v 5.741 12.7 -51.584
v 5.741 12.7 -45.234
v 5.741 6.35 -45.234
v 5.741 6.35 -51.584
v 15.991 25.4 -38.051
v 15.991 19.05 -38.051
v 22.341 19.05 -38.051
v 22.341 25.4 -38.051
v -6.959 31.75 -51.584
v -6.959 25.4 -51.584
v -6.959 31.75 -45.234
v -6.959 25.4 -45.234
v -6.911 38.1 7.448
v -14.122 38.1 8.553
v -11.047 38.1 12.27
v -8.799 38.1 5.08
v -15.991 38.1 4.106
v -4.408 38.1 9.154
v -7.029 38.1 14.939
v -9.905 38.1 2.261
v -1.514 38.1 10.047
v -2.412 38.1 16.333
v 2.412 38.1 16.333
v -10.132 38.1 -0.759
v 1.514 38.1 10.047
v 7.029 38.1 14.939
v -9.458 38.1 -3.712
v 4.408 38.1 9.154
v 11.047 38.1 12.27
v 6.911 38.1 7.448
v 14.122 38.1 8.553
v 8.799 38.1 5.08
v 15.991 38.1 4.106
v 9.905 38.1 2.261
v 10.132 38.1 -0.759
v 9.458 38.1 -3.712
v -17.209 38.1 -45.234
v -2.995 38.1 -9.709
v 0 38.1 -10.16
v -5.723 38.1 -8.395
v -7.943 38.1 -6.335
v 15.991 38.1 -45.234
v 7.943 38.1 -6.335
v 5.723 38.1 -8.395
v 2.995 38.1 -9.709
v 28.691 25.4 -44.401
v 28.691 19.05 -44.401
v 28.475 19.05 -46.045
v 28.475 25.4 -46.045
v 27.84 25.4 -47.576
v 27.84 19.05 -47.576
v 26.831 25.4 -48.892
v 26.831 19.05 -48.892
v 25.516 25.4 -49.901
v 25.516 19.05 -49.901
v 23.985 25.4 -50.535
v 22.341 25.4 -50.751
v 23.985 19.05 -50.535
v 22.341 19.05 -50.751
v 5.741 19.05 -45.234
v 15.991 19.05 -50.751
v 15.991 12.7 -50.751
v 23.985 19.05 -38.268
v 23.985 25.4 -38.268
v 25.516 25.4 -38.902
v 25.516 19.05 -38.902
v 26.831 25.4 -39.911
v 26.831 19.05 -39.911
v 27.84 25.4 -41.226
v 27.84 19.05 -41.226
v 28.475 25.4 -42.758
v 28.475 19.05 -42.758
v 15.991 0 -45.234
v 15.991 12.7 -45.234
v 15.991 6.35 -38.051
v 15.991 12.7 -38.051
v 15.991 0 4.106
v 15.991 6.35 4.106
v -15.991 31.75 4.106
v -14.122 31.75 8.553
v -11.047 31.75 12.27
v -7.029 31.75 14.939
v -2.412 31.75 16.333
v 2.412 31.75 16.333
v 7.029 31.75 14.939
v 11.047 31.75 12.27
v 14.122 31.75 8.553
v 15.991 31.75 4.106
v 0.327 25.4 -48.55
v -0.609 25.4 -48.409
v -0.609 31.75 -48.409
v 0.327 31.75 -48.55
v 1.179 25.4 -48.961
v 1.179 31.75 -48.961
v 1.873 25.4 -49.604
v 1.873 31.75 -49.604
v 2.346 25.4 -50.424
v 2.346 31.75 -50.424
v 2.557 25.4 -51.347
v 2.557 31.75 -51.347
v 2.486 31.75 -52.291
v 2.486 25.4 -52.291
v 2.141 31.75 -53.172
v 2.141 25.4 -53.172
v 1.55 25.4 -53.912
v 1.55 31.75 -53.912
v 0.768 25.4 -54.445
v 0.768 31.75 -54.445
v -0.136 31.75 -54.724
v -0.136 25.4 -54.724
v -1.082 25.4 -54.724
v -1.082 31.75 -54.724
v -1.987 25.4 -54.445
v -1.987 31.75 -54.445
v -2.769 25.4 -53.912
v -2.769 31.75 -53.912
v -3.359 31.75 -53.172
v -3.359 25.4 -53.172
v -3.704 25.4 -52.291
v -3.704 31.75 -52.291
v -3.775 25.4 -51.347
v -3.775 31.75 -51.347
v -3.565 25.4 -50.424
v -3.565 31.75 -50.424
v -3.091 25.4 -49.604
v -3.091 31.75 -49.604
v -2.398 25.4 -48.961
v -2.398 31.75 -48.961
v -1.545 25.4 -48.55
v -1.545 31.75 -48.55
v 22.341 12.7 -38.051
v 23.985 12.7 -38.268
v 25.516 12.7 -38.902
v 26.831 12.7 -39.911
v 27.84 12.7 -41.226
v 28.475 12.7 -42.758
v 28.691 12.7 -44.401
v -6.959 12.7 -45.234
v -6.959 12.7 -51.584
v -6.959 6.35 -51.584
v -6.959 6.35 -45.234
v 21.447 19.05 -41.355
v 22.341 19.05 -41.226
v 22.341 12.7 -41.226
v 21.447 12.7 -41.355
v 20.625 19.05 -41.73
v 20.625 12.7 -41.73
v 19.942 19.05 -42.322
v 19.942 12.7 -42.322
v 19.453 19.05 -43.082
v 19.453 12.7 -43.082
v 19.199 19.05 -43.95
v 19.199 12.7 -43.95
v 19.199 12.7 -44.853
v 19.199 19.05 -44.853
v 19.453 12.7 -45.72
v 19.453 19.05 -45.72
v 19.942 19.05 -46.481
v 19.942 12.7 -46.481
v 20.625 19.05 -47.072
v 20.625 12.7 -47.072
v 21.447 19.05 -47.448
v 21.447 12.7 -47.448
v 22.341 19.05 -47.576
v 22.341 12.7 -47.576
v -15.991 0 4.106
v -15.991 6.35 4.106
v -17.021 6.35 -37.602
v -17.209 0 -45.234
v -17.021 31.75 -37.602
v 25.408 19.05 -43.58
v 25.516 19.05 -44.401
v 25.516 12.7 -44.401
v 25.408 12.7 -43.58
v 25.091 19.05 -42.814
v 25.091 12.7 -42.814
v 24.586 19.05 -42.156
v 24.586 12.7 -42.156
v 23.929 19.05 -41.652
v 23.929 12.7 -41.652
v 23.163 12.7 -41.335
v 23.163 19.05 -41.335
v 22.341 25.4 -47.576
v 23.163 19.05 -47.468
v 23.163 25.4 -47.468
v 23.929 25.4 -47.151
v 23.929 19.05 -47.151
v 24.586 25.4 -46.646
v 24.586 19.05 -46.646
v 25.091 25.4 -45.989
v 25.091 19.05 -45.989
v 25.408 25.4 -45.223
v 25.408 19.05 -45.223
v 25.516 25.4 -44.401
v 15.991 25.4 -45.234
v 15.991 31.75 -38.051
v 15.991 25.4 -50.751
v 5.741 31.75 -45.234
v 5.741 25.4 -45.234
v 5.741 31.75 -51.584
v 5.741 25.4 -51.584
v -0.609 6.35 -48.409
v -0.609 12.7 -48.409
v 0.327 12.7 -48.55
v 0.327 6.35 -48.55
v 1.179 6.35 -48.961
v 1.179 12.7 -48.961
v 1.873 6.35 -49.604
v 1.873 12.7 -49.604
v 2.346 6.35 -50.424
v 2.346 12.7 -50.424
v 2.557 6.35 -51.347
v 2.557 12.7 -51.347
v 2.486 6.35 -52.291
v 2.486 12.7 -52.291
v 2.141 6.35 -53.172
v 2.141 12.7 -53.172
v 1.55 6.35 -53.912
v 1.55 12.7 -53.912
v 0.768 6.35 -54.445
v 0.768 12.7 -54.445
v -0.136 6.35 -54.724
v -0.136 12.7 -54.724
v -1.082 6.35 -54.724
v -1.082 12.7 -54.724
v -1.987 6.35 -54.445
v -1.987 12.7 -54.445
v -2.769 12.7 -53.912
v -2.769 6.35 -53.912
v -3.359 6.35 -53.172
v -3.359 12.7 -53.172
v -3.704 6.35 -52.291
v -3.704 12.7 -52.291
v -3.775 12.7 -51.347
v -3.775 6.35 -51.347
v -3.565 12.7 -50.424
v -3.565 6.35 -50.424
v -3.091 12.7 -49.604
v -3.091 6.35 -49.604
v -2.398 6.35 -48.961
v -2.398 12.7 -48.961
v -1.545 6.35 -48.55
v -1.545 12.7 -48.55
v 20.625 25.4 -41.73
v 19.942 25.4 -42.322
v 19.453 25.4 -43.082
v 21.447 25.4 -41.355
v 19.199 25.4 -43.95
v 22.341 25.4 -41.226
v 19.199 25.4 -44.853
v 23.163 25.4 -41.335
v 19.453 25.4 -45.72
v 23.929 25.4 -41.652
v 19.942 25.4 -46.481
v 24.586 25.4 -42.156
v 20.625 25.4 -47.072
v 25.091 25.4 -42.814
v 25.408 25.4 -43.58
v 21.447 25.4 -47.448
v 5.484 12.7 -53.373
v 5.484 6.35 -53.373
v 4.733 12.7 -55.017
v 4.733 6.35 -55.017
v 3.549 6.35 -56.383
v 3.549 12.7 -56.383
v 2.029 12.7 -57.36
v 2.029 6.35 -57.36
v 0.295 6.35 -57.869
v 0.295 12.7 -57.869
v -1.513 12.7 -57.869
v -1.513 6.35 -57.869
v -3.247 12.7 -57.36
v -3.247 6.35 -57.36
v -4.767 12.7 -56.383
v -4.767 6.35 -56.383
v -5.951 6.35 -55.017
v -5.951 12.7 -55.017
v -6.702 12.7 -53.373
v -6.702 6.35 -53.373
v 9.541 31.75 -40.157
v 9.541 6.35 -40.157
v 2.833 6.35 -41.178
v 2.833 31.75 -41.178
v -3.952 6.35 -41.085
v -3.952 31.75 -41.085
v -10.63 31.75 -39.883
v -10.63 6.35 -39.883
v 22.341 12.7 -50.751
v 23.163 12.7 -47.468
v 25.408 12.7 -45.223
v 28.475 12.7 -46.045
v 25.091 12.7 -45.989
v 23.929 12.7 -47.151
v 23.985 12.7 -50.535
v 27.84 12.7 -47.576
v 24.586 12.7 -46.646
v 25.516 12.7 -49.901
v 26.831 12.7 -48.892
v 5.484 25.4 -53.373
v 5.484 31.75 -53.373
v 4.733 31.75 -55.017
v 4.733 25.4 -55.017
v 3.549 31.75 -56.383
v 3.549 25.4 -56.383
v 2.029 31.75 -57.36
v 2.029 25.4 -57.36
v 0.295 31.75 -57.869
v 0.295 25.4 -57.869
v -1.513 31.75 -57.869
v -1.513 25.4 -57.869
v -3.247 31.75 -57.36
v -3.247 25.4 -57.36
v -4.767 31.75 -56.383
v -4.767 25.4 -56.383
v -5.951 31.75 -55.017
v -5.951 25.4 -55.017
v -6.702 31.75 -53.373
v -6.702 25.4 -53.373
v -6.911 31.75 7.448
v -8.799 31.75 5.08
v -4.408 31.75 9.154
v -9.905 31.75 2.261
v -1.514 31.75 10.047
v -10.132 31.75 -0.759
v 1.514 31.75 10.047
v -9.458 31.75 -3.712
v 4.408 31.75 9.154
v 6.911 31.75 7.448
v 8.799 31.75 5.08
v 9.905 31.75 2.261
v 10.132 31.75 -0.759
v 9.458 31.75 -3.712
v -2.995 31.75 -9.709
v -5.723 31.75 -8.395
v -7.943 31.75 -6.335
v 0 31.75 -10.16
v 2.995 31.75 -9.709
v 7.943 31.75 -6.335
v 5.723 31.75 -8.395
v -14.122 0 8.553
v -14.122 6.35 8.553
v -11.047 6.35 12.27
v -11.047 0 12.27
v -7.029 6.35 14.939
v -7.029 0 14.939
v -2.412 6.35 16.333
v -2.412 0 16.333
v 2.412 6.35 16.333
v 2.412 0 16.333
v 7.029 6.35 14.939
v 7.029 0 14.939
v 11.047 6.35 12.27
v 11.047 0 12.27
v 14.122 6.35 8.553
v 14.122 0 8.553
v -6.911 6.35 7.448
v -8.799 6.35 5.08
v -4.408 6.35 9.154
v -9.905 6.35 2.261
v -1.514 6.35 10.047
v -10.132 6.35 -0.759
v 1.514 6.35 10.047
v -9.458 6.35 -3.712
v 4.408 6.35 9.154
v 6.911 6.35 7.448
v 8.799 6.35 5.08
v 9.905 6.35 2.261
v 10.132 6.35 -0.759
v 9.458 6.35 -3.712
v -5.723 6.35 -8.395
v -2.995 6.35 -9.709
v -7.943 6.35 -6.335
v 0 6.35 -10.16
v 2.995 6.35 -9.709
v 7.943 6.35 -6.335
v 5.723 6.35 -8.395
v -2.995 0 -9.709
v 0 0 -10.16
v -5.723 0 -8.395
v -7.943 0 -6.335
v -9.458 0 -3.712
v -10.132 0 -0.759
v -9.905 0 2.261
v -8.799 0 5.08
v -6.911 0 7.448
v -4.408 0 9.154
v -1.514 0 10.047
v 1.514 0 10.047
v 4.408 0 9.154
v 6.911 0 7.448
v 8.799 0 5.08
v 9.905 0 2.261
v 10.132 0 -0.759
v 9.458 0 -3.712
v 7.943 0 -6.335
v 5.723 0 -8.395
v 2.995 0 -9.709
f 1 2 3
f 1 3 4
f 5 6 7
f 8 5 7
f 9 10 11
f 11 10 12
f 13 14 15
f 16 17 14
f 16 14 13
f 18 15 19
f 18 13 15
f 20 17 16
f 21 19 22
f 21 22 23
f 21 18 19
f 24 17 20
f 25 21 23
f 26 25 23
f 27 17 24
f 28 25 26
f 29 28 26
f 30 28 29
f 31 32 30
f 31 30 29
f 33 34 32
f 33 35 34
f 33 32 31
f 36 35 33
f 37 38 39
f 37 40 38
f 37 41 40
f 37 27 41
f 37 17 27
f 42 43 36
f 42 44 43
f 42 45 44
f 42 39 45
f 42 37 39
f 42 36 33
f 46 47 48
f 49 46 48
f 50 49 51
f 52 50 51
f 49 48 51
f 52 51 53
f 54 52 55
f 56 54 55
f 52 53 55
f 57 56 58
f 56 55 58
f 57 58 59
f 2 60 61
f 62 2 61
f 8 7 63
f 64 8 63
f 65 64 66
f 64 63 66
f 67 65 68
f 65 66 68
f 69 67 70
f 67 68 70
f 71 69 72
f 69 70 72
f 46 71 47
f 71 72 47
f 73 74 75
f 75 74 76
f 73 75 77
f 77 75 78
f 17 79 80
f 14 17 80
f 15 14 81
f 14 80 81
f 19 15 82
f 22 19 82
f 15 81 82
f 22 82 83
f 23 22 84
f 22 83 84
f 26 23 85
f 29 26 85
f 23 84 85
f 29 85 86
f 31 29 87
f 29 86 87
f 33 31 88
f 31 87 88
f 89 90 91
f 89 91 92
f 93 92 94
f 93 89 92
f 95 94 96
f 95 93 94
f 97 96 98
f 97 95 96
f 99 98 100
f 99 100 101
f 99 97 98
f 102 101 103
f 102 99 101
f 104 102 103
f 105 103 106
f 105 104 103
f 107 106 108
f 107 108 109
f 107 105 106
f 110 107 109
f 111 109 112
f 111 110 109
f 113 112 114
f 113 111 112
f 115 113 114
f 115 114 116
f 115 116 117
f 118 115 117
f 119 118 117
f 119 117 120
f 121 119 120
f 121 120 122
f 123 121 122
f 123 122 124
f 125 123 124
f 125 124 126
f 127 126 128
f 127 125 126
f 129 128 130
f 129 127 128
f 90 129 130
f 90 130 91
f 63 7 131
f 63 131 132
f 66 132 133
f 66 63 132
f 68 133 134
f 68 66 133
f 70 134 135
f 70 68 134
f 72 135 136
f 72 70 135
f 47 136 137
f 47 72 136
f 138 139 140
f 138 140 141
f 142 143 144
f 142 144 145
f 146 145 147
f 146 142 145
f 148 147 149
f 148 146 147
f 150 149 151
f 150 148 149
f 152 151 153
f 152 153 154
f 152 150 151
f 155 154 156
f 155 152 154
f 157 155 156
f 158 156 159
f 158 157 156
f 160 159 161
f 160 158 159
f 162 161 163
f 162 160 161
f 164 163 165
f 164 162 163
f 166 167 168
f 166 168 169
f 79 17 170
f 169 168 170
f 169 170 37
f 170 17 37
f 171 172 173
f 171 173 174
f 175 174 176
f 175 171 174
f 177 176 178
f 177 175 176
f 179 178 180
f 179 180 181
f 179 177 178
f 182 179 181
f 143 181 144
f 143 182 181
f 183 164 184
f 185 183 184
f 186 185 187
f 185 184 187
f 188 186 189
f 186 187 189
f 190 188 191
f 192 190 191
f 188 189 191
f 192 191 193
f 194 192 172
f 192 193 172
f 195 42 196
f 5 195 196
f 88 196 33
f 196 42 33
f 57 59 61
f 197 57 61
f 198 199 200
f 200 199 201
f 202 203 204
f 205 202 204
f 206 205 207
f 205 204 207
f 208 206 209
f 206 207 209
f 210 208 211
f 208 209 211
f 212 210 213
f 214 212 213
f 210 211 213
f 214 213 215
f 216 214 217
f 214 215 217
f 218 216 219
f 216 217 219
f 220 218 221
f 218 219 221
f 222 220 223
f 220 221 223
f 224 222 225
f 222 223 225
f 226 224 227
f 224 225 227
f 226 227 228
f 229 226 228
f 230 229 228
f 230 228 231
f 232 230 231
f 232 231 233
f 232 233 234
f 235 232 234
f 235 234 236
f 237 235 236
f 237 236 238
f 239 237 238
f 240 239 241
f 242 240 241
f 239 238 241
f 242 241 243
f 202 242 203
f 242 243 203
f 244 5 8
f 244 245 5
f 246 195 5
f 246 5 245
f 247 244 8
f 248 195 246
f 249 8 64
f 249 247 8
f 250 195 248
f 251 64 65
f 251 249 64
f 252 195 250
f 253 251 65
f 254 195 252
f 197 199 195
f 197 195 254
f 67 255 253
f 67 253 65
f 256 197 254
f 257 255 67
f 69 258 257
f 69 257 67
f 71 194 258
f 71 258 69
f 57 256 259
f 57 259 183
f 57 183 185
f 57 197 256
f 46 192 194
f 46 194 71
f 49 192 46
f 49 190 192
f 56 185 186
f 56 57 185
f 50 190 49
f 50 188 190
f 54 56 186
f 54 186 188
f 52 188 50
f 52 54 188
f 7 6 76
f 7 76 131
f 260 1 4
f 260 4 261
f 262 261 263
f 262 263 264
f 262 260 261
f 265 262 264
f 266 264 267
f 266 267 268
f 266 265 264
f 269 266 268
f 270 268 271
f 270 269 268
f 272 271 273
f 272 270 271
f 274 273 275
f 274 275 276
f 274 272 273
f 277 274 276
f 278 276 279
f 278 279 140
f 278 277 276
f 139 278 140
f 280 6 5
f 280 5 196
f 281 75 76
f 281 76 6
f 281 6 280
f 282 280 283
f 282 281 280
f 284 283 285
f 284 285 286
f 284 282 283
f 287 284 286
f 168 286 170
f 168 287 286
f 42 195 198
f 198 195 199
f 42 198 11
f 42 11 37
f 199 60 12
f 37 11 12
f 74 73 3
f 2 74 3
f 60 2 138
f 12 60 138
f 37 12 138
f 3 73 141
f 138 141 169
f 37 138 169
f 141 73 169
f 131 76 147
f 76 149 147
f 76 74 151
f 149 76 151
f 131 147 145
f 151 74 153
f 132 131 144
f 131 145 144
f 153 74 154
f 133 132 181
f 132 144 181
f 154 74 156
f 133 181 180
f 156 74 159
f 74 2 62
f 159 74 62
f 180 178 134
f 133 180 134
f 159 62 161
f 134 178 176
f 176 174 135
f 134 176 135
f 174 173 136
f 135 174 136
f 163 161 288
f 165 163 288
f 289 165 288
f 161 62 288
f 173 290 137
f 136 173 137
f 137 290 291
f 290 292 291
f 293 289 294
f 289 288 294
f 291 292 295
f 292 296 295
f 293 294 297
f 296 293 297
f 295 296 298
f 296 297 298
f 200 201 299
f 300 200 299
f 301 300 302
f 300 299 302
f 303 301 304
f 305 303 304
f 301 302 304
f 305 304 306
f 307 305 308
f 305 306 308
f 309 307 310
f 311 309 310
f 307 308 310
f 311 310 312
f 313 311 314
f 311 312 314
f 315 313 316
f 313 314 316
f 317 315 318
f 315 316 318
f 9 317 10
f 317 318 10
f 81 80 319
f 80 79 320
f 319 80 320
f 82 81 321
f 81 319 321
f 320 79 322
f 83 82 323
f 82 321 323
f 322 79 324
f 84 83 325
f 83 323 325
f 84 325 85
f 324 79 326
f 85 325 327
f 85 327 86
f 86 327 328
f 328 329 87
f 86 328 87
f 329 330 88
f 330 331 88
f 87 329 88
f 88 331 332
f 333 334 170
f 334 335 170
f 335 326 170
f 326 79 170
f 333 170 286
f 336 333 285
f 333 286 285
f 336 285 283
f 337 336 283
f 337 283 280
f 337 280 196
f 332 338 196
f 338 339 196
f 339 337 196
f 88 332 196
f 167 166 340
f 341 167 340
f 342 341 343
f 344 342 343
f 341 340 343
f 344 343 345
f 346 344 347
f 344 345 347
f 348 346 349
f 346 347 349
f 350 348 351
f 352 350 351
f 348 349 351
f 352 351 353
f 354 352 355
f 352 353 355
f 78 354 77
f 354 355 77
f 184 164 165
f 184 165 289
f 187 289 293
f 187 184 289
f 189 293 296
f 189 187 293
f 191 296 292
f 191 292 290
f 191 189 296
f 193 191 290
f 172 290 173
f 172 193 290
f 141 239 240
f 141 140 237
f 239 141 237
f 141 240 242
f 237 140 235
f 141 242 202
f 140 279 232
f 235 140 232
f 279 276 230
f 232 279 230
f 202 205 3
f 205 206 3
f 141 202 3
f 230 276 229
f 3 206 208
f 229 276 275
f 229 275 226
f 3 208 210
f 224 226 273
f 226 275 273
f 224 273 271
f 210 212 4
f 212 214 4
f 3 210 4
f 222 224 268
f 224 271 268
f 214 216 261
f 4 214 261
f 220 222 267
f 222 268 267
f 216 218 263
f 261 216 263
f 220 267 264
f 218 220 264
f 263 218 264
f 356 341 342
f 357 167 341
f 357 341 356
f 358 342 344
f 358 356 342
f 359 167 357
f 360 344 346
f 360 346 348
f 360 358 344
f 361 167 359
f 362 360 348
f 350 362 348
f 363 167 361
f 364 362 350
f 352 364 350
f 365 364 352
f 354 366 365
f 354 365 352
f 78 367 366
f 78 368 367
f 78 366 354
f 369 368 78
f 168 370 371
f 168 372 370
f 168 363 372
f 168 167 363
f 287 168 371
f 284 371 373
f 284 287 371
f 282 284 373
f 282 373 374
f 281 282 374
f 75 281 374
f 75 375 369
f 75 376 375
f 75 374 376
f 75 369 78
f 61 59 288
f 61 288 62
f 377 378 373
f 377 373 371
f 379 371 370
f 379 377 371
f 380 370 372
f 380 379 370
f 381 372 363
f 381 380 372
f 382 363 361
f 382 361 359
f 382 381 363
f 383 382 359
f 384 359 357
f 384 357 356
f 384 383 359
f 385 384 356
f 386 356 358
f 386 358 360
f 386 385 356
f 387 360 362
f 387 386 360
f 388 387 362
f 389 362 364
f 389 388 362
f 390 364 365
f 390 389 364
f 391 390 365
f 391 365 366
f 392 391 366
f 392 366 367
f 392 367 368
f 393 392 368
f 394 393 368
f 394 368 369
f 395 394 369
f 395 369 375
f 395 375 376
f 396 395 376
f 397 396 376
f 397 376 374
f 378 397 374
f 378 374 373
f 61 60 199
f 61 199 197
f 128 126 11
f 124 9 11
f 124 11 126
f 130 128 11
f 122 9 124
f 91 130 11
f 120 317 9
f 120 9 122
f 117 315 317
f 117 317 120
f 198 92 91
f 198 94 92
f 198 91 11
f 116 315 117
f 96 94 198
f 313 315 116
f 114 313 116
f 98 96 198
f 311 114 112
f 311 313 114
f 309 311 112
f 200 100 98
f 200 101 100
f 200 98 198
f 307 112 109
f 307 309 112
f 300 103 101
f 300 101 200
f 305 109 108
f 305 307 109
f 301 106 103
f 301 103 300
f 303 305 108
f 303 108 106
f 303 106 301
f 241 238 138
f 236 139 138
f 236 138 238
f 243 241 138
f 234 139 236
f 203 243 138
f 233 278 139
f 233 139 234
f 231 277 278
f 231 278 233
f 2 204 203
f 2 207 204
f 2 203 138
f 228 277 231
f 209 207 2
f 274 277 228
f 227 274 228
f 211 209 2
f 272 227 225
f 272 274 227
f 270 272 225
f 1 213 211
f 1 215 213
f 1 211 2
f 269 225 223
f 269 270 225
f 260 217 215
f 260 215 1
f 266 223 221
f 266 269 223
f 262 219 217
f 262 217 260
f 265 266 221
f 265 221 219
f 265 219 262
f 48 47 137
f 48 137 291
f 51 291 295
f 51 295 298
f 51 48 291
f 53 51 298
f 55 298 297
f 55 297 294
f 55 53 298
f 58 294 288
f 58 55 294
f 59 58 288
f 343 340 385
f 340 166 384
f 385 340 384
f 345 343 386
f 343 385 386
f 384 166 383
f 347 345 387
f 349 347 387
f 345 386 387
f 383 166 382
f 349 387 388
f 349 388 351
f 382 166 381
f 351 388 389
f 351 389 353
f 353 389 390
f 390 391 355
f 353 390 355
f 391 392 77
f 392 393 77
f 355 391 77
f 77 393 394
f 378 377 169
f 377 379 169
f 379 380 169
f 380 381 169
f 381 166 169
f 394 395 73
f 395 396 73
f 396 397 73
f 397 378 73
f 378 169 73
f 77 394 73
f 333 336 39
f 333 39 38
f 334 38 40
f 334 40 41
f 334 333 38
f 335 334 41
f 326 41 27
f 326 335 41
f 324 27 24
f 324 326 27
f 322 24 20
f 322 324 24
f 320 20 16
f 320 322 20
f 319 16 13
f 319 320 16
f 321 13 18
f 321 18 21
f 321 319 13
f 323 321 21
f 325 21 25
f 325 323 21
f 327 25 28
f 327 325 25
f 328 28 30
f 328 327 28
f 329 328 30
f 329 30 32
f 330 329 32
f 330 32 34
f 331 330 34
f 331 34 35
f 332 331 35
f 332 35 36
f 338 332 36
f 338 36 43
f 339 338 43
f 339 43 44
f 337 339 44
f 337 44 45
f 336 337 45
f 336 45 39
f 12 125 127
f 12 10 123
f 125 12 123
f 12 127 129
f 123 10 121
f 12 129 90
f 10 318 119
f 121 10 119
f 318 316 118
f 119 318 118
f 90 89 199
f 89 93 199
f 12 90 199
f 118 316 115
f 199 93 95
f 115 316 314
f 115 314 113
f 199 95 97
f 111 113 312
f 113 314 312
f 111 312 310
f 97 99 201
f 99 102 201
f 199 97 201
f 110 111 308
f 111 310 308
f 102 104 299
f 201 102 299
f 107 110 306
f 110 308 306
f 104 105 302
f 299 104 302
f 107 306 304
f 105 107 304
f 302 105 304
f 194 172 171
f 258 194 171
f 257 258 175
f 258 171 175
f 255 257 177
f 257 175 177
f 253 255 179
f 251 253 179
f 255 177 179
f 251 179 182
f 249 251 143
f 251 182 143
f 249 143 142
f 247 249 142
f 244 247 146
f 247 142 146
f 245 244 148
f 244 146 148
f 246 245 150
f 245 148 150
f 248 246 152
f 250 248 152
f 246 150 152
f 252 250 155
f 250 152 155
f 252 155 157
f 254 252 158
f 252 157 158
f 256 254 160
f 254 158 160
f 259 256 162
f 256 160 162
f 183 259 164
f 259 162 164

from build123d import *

# Parameters (mm, degrees)
SKETCH1_R           = 16.51
SKETCH1_R_2         = 10.16
BOSS_EXTRUDE1_DEPTH = 38.1
CUT_EXTRUDE1_START  = 6.35
SKETCH1_3_R         = 16.51
SKETCH1_3_R_2       = 10.16
CUT_EXTRUDE1_DEPTH  = 25.4
CUT_EXTRUDE2_REACH  = 66.365
BOSS_EXTRUDE2_START = 6.35
SKETCH7_R           = 3.175
BOSS_EXTRUDE2_DEPTH = 6.35
BOSS_EXTRUDE3_DEPTH = 6.35


with BuildPart() as part:
    # Sketch1 → Boss-Extrude1 (new body)
    # profile 1 of 4: a face of its own
    with BuildSketch(Plane(origin=(0, 0, 0), x_dir=(1, 0, 0), z_dir=(0, 1, 0))):
        with BuildLine():
            Line((-25.4, 45.234068682), (-25.4, 32.534068682))
            ThreePointArc((-25.4, 32.534068682), (0, 41.275), (25.4, 32.534068682))
            Line((25.4, 32.534068682), (25.4, 45.234068682))
            Line((25.4, 45.234068682), (-25.4, 45.234068682))
        make_face()
    # profile 2 of 4: a face of its own
    with BuildSketch(Plane(origin=(0, 0, 0), x_dir=(1, 0, 0), z_dir=(0, 1, 0))):
        with BuildLine():
            ThreePointArc((25.4, 32.534068682), (0, 41.275), (-25.4, 32.534068682))
            Line((-25.4, 32.534068682), (25.4, 32.534068682))
        make_face()
    # profile 3 of 4: a face of its own
    with BuildSketch(Plane(origin=(0, 0, 0), x_dir=(1, 0, 0), z_dir=(0, 1, 0))):
        with BuildLine():
            Line((25.4, 32.534068682), (-25.4, 32.534068682))
            Line((-25.4, 32.534068682), (-15.991186592, -4.106342823))
            ThreePointArc((-15.991186592, -4.106342823), (-2.069493823, 16.379783128), (16.51, 0))
            ThreePointArc((16.51, 0), (16.379783128, -2.069493823), (15.991186592, -4.106342823))
            Line((15.991186592, -4.106342823), (25.4, 32.534068682))
        make_face()
    # profile 4 of 4: a face of its own
    with BuildSketch(Plane(origin=(0, 0, 0), x_dir=(1, 0, 0), z_dir=(0, 1, 0))):
        Circle(SKETCH1_R)
        with Locations(Location((0, 0, 0), (0, 0, 90))):
            Circle(SKETCH1_R_2, mode=Mode.SUBTRACT)
    extrude(amount=BOSS_EXTRUDE1_DEPTH)

    # Sketch1<3> → Cut-Extrude1 (cut)
    # profile 1 of 3: a face of its own
    with BuildSketch(Plane(origin=(0, 0, 0), x_dir=(1, 0, 0), z_dir=(0, 1, 0)).offset(CUT_EXTRUDE1_START)):
        with BuildLine():
            Line((25.4, 32.534068682), (-25.4, 32.534068682))
            Line((-25.4, 32.534068682), (-15.991186592, -4.106342823))
            ThreePointArc((-15.991186592, -4.106342823), (-2.069493823, 16.379783128), (16.51, 0))
            ThreePointArc((16.51, 0), (16.379783128, -2.069493823), (15.991186592, -4.106342823))
            Line((15.991186592, -4.106342823), (25.4, 32.534068682))
        make_face()
    # profile 2 of 3: a face of its own
    with BuildSketch(Plane(origin=(0, 0, 0), x_dir=(1, 0, 0), z_dir=(0, 1, 0)).offset(CUT_EXTRUDE1_START)):
        with BuildLine():
            ThreePointArc((25.4, 32.534068682), (0, 41.275), (-25.4, 32.534068682))
            Line((-25.4, 32.534068682), (25.4, 32.534068682))
        make_face()
    # profile 3 of 3: a face of its own
    with BuildSketch(Plane(origin=(0, 0, 0), x_dir=(1, 0, 0), z_dir=(0, 1, 0)).offset(CUT_EXTRUDE1_START)):
        Circle(SKETCH1_3_R)
        with Locations(Location((0, 0, 0), (0, 0, 90))):
            Circle(SKETCH1_3_R_2, mode=Mode.SUBTRACT)
    extrude(amount=CUT_EXTRUDE1_DEPTH, mode=Mode.SUBTRACT)

    # Cut-Extrude2: up to this face of the body (flat: up to its plane)
    cut_extrude2_end = Plane(part.part.faces().sort_by_distance((0, 0, -21.591993841))[0])
    # Sketch5 → Cut-Extrude2 (cut, up to the picked face)
    with BuildSketch(Plane(origin=(0, 38.1, 0), x_dir=(1, 0, 0), z_dir=(0, 1, 0)), mode=Mode.PRIVATE) as cut_extrude2_sk1:
        Polygon((15.991186592, 45.234068682), (15.991186592, -4.106342823), (25.4, 32.534068682), (25.4, 45.234068682), align=None)
    cut_extrude2_tool1 = split(extrude(cut_extrude2_sk1.sketch, amount=-CUT_EXTRUDE2_REACH, mode=Mode.PRIVATE), bisect_by=cut_extrude2_end, keep=Keep.BOTH, mode=Mode.PRIVATE)
    # Sketch5 → Cut-Extrude2 (cut, up to the picked face)
    with BuildSketch(Plane(origin=(0, 38.1, 0), x_dir=(1, 0, 0), z_dir=(0, 1, 0)), mode=Mode.PRIVATE) as cut_extrude2_sk2:
        Polygon((-25.4, 32.534068682), (-15.991186592, -4.106342823), (-17.209379635, 45.234068682), (-25.4, 45.234068682), align=None)
    cut_extrude2_tool2 = split(extrude(cut_extrude2_sk2.sketch, amount=-CUT_EXTRUDE2_REACH, mode=Mode.PRIVATE), bisect_by=cut_extrude2_end, keep=Keep.BOTH, mode=Mode.PRIVATE)
    add(cut_extrude2_tool1.solids().sort_by(Axis((19.769469, 38.1, -27.920679), (0, -1, 0)))[0], mode=Mode.SUBTRACT)
    add(cut_extrude2_tool2.solids().sort_by(Axis((-20.156564, 38.1, -27.821204), (0, -1, 0)))[0], mode=Mode.SUBTRACT)

    # Sketch7 → Boss-Extrude2 (add)
    with BuildSketch(Plane(origin=(0, 19.05, 0), x_dir=(1, 0, 0), z_dir=(0, 1, 0)).offset(BOSS_EXTRUDE2_START)):
        with BuildLine():
            Line((5.740903479, 45.234068682), (5.740903479, 51.584068682))
            ThreePointArc((5.740903479, 51.584068682), (-0.609096521, 57.934068682), (-6.959096521, 51.584068682))
            Line((-6.959096521, 51.584068682), (-6.959096521, 45.234068682))
            Line((-6.959096521, 45.234068682), (-0.609096521, 45.234068682))
            Line((-0.609096521, 45.234068682), (5.740903479, 45.234068682))
        make_face()
        with Locations(Location((-0.609096521, 51.584068682, 0), (0, 0, 270))):
            Circle(SKETCH7_R, mode=Mode.SUBTRACT)
    boss_extrude2 = extrude(amount=BOSS_EXTRUDE2_DEPTH)

    # Sketch8 → Boss-Extrude3 (add)
    with BuildSketch(Plane(origin=(0, 19.05, 0), x_dir=(1, 0, 0), z_dir=(0, 1, 0))):
        with BuildLine():
            ThreePointArc((15.991186592, 44.401380742), (17.851058531, 39.911252682), (22.341186592, 38.051380742))
            Line((22.341186592, 38.051380742), (22.341186592, 41.226380742))
            ThreePointArc((22.341186592, 41.226380742), (19.166186592, 44.401380742), (22.341186592, 47.576380742))
            Line((22.341186592, 47.576380742), (22.341186592, 50.751380742))
            ThreePointArc((22.341186592, 50.751380742), (17.851058531, 48.891508803), (15.991186592, 44.401380742))
        make_face()
        with BuildLine():
            Line((22.341186592, 41.226380742), (22.341186592, 38.051380742))
            ThreePointArc((22.341186592, 38.051380742), (26.831314653, 39.911252682), (28.691186592, 44.401380742))
            ThreePointArc((28.691186592, 44.401380742), (26.831314653, 48.891508803), (22.341186592, 50.751380742))
            Line((22.341186592, 50.751380742), (22.341186592, 47.576380742))
            ThreePointArc((22.341186592, 47.576380742), (24.586250622, 46.646444772), (25.516186592, 44.401380742))
            ThreePointArc((25.516186592, 44.401380742), (24.586250622, 42.156316712), (22.341186592, 41.226380742))
        make_face()
        with BuildLine():
            ThreePointArc((15.991186592, 44.401380742), (17.851058531, 39.911252682), (22.341186592, 38.051380742))
            Line((22.341186592, 38.051380742), (22.341186592, 41.226380742))
            ThreePointArc((22.341186592, 41.226380742), (19.166186592, 44.401380742), (22.341186592, 47.576380742))
            Line((22.341186592, 47.576380742), (22.341186592, 50.751380742))
            ThreePointArc((22.341186592, 50.751380742), (17.851058531, 48.891508803), (15.991186592, 44.401380742))
        make_face()
        with BuildLine():
            Line((22.341186592, 41.226380742), (22.341186592, 38.051380742))
            ThreePointArc((22.341186592, 38.051380742), (26.831314653, 39.911252682), (28.691186592, 44.401380742))
            ThreePointArc((28.691186592, 44.401380742), (26.831314653, 48.891508803), (22.341186592, 50.751380742))
            Line((22.341186592, 50.751380742), (22.341186592, 47.576380742))
            ThreePointArc((22.341186592, 47.576380742), (24.586250622, 46.646444772), (25.516186592, 44.401380742))
            ThreePointArc((25.516186592, 44.401380742), (24.586250622, 42.156316712), (22.341186592, 41.226380742))
        make_face()
        with BuildLine():
            Line((15.991186592, 45.234068682), (15.991186592, 44.401380742))
            ThreePointArc((15.991186592, 44.401380742), (17.851058531, 48.891508803), (22.341186592, 50.751380742))
            Line((22.341186592, 50.751380742), (15.991186592, 50.751380742))
            Line((15.991186592, 50.751380742), (15.991186592, 45.234068682))
        make_face()
        with BuildLine():
            Line((15.991186592, 44.401380742), (15.991186592, 38.051380742))
            Line((15.991186592, 38.051380742), (22.341186592, 38.051380742))
            ThreePointArc((22.341186592, 38.051380742), (17.851058531, 39.911252682), (15.991186592, 44.401380742))
        make_face()
        Polygon((15.991186592, 50.751380742), (15.991186592, 45.234068682), (5.740903479, 45.234068682), align=None)
    boss_extrude3 = extrude(amount=BOSS_EXTRUDE3_DEPTH)

    # Mirror1: Boss-Extrude2, Boss-Extrude3 across plane
    add(boss_extrude2.mirror(Plane.ZX.offset(19.05)))
    add(boss_extrude3.mirror(Plane.ZX.offset(19.05)))


solid = part.part
